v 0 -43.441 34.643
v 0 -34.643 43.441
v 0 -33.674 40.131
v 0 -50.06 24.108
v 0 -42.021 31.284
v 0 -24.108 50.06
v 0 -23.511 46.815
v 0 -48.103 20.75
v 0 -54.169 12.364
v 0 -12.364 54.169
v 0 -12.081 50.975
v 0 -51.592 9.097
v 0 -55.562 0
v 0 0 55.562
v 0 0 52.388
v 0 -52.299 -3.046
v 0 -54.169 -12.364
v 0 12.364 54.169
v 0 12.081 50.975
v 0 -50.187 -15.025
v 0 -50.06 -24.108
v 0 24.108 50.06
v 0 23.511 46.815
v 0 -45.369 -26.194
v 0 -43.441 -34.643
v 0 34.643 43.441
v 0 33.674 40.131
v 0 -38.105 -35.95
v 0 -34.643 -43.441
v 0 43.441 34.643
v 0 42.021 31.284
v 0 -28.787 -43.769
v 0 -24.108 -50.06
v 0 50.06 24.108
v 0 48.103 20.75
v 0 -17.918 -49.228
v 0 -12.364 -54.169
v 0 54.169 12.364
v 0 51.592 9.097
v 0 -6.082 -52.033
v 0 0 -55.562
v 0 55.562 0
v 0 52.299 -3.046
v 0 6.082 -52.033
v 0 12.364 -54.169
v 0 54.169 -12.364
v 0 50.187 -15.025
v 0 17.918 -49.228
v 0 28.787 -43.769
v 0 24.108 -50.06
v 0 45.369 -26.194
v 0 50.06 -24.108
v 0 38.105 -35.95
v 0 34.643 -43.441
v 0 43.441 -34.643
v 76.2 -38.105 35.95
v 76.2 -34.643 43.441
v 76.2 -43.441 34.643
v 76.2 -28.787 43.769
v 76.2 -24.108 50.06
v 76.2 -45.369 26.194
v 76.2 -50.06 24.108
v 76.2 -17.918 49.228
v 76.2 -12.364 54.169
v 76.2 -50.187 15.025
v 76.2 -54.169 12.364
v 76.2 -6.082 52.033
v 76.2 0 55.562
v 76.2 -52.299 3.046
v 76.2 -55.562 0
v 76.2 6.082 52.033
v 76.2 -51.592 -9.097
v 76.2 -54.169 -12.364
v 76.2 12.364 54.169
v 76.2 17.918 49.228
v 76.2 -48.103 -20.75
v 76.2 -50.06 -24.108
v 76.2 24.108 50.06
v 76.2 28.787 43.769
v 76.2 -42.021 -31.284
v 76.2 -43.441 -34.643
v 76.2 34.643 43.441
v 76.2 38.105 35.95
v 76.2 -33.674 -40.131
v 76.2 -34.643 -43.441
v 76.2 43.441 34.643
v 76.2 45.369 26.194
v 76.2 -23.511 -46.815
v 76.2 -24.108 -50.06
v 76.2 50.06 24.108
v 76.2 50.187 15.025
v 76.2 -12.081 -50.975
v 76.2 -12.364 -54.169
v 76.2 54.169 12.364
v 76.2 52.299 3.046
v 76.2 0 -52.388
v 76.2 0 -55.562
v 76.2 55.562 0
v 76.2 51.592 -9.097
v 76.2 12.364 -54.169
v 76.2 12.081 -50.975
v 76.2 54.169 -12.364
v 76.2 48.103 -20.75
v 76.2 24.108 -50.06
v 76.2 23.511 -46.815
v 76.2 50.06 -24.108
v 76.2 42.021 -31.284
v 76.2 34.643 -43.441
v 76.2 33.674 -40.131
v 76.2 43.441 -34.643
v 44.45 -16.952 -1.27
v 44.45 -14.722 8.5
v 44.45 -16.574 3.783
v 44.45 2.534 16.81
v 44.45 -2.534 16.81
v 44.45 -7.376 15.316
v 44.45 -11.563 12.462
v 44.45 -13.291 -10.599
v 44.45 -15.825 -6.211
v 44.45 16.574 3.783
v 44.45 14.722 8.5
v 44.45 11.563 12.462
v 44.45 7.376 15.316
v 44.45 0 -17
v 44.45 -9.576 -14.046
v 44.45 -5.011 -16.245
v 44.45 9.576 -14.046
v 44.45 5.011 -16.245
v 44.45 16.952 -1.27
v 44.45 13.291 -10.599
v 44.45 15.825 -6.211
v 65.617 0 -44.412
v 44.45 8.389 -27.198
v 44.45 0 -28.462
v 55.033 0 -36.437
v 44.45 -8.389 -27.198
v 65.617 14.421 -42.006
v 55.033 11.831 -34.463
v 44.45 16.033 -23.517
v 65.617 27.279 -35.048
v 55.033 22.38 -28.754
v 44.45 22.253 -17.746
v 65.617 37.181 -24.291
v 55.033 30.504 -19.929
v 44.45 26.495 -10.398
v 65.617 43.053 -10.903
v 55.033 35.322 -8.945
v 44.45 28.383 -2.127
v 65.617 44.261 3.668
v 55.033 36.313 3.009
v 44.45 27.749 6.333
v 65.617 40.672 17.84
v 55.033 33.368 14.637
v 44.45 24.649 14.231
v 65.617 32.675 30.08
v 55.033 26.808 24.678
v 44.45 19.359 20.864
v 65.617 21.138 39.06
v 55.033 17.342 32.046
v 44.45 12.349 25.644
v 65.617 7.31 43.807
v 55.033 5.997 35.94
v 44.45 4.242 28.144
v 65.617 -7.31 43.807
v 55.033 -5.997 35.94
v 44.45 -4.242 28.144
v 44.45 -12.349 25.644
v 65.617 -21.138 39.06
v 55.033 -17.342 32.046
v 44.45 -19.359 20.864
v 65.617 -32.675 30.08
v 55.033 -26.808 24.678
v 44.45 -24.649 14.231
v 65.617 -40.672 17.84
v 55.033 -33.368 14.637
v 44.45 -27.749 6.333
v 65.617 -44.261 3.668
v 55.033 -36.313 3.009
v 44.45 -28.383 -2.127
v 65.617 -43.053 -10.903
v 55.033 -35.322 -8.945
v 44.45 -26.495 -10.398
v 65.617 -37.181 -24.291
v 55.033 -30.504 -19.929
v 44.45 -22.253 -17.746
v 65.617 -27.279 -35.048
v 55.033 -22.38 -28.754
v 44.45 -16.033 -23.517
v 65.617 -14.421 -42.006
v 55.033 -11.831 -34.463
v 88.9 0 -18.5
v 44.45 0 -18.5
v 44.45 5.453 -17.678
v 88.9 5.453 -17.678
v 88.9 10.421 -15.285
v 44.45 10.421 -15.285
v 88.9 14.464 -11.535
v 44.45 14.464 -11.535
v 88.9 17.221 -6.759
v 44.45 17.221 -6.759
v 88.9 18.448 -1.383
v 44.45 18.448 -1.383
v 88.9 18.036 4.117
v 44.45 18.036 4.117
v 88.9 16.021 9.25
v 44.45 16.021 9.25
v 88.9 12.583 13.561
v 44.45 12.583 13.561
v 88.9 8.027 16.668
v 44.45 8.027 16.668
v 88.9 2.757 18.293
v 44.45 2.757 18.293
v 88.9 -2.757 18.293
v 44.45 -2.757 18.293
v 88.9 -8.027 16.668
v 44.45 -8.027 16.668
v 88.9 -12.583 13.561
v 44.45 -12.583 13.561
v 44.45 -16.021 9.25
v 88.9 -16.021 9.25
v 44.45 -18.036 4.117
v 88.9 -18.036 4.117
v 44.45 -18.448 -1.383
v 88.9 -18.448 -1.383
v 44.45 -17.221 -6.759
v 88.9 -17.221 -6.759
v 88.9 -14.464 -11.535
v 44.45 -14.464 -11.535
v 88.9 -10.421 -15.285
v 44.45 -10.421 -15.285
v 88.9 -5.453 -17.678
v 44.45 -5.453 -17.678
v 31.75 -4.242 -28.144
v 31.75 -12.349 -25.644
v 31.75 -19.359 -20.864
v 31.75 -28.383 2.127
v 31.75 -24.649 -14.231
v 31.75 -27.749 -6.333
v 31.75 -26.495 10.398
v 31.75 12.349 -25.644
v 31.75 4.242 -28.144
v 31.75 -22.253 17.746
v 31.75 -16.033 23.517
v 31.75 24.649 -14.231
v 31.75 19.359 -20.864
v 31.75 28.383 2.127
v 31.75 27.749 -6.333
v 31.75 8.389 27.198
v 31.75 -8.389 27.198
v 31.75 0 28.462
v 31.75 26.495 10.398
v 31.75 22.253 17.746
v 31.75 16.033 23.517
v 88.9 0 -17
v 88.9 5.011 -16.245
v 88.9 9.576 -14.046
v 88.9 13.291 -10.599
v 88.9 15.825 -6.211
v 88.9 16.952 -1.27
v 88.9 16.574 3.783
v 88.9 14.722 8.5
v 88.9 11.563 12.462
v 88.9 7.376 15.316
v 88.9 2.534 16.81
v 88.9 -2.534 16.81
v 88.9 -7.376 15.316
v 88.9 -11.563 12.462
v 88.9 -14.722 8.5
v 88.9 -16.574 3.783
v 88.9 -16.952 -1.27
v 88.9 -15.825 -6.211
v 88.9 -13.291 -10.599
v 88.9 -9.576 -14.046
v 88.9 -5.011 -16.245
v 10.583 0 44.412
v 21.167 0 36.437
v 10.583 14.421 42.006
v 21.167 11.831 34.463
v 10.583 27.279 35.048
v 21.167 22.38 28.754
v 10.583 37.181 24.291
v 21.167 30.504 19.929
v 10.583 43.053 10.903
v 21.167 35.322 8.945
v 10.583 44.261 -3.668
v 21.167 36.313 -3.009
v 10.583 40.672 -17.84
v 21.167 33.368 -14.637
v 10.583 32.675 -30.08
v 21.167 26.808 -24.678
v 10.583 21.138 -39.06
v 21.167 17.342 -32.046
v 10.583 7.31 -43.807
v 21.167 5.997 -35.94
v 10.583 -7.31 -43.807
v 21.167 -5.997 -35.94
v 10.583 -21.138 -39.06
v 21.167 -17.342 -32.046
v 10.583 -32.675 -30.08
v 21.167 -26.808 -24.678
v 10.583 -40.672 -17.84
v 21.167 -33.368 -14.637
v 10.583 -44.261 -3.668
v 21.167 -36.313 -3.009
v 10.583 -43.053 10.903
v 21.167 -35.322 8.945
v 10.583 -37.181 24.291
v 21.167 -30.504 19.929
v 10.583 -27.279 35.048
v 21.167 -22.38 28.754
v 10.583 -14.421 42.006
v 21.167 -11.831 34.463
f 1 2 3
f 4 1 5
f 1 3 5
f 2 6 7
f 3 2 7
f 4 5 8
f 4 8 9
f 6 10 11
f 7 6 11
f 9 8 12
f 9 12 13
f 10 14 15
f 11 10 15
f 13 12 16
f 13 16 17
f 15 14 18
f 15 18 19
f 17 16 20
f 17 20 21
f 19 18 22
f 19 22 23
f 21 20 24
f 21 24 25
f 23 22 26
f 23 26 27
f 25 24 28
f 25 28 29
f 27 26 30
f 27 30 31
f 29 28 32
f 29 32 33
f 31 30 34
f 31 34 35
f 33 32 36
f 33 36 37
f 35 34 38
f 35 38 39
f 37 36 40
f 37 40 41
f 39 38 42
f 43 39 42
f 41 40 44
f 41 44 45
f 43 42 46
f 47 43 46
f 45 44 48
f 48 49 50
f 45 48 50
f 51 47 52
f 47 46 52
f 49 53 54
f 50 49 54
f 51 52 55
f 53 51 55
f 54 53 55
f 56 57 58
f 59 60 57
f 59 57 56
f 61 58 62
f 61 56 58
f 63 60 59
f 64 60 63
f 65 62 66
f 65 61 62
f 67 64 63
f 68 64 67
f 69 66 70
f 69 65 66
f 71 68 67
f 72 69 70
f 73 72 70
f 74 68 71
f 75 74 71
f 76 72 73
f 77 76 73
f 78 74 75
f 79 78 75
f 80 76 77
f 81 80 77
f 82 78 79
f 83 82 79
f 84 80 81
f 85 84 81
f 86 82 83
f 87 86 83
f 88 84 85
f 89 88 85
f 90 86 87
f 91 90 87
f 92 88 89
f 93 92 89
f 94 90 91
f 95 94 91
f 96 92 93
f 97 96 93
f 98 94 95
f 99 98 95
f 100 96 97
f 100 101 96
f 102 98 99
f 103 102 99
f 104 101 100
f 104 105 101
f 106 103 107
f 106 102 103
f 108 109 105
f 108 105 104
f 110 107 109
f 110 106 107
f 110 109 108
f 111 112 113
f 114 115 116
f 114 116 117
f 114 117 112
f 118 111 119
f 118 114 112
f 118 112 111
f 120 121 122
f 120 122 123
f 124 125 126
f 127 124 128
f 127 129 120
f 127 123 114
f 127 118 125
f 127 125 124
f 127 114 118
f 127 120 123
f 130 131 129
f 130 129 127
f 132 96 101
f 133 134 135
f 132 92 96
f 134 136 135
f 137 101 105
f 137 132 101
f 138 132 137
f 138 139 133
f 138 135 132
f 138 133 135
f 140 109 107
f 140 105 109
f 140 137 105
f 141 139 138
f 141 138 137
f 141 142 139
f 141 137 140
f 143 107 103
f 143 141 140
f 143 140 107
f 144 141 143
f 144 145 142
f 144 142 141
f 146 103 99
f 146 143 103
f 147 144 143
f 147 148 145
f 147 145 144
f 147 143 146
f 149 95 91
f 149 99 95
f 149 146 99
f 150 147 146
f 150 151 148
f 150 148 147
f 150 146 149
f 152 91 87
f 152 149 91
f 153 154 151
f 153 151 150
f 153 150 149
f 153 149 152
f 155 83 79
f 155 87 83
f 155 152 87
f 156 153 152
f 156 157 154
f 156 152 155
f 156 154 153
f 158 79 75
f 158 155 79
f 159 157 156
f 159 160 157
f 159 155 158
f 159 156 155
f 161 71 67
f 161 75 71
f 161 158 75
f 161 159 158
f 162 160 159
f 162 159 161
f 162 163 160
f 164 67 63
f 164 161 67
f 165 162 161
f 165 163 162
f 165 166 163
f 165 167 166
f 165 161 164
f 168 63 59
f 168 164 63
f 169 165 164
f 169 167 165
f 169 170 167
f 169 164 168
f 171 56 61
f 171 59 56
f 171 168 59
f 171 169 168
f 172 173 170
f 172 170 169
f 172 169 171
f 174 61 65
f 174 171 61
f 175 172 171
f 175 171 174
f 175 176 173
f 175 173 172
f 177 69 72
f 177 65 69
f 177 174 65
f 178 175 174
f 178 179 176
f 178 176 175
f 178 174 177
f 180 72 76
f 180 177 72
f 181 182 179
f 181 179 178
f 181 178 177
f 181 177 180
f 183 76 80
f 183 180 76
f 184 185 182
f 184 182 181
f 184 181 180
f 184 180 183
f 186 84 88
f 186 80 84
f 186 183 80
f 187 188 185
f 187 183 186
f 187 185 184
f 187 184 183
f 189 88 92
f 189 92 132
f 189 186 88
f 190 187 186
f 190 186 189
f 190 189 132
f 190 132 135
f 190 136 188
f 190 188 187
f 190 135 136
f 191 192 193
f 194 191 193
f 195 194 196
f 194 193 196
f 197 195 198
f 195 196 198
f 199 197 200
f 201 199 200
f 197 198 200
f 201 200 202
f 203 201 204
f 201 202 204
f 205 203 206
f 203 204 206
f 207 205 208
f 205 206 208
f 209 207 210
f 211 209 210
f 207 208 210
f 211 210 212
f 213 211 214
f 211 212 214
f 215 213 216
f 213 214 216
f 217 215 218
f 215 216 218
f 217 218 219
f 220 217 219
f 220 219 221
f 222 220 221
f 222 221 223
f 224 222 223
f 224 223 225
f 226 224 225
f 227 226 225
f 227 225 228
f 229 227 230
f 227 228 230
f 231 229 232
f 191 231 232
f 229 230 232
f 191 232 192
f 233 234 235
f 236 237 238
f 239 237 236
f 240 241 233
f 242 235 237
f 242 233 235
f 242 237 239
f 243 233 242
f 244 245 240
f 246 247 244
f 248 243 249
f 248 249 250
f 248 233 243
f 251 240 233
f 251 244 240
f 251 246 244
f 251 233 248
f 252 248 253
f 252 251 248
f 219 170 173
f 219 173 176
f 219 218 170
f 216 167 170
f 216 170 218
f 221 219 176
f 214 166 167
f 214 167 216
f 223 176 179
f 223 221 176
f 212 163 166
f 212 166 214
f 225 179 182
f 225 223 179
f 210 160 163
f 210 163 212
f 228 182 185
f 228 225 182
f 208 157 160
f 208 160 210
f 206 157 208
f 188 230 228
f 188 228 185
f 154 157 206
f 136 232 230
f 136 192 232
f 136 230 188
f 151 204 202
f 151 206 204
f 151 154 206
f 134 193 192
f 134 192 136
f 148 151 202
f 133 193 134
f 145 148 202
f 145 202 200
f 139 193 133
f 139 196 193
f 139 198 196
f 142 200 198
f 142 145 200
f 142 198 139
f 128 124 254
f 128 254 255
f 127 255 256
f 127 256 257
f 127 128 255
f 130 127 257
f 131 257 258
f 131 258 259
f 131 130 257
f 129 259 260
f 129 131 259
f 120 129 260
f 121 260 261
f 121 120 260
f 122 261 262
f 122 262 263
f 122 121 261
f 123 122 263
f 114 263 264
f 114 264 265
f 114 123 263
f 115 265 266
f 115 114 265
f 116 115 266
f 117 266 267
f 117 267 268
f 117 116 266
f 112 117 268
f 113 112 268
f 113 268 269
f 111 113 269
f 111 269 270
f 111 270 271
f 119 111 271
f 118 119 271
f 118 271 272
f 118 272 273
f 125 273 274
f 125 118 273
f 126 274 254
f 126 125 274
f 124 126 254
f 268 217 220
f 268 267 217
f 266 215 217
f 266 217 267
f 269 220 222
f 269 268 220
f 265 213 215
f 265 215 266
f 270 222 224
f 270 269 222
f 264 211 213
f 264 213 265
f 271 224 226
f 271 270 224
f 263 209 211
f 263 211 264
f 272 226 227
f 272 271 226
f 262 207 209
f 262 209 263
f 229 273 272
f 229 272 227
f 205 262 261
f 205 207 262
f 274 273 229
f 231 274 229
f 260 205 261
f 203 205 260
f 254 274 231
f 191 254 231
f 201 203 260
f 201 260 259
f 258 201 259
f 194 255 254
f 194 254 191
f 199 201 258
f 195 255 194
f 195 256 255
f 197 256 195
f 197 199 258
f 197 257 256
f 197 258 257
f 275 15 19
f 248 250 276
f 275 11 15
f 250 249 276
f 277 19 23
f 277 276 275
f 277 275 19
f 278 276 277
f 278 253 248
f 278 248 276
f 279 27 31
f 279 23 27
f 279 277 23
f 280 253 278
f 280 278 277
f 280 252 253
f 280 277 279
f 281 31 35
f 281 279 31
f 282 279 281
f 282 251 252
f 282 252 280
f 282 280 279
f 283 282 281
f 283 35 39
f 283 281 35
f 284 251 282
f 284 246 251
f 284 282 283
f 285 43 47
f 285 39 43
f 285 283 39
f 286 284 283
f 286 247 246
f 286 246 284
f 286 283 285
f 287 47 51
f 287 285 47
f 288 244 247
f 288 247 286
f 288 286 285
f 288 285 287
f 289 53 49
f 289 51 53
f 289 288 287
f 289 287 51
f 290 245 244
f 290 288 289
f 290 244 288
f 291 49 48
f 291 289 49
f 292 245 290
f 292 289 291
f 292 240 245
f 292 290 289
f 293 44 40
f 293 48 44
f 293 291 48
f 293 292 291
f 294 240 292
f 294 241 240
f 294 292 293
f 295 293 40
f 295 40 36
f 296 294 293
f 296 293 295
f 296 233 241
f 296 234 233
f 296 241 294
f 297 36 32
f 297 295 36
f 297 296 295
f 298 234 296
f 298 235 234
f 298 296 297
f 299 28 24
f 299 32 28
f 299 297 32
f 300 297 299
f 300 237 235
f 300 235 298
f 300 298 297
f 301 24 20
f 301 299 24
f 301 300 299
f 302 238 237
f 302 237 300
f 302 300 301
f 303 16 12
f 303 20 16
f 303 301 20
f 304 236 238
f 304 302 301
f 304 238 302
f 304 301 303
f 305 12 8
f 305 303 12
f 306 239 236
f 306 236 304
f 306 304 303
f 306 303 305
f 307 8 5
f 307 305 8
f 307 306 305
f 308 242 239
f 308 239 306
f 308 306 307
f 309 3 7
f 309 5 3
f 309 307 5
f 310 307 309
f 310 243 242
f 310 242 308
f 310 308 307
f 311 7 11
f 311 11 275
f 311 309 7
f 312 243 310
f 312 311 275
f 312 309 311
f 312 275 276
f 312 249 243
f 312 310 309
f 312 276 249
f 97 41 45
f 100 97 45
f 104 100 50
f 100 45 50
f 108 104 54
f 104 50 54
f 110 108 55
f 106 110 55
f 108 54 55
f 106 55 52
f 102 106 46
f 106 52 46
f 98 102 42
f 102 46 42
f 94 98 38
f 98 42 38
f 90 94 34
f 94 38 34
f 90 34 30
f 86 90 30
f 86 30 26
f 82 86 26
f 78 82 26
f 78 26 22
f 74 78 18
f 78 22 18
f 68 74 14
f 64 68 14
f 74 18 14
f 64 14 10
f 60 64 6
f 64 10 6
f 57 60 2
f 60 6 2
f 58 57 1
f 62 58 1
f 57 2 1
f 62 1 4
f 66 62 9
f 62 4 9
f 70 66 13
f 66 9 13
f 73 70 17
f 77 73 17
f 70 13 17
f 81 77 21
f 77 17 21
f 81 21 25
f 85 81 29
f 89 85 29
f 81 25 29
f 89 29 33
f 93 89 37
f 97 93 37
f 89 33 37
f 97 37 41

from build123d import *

# Parameters (mm, degrees)
SKETCH1_R           = 55.5625
BOSS_EXTRUDE1_DEPTH = 76.2
SKETCH2_R           = 52.3875
CUT_EXTRUDE1_DEPTH  = 31.75
CUT_EXTRUDE1_TAPER  = 37
SKETCH3_R           = 52.3875
CUT_EXTRUDE2_DEPTH  = 31.75
CUT_EXTRUDE2_TAPER  = 37
SKETCH4_R           = 18.5
SKETCH4_R_2         = 17
BOSS_EXTRUDE2_DEPTH = 44.45


with BuildPart() as part:
    # Sketch1 → Boss-Extrude1 (new body)
    with BuildSketch(Plane(origin=(0, 0, 0), x_dir=(0, 0, -1), z_dir=(1, 0, 0))):
        Circle(SKETCH1_R)
    extrude(amount=BOSS_EXTRUDE1_DEPTH)

    # Sketch2 → Cut-Extrude1 (cut)
    with BuildSketch(Plane(origin=(76.2, 0, 0), x_dir=(0, 0, -1), z_dir=(1, 0, 0))):
        Circle(SKETCH2_R)
    extrude(amount=-CUT_EXTRUDE1_DEPTH, taper=CUT_EXTRUDE1_TAPER, mode=Mode.SUBTRACT)

    # Sketch3 → Cut-Extrude2 (cut)
    with BuildSketch(Plane.ZY):
        Circle(SKETCH3_R)
    extrude(amount=-CUT_EXTRUDE2_DEPTH, taper=CUT_EXTRUDE2_TAPER, mode=Mode.SUBTRACT)

    # Sketch4 → Boss-Extrude2 (add)
    with BuildSketch(Plane(origin=(44.45, 0, 0), x_dir=(0, 0, -1), z_dir=(1, 0, 0))):
        Circle(SKETCH4_R)
        Circle(SKETCH4_R_2, mode=Mode.SUBTRACT)
    extrude(amount=BOSS_EXTRUDE2_DEPTH)


solid = part.part
